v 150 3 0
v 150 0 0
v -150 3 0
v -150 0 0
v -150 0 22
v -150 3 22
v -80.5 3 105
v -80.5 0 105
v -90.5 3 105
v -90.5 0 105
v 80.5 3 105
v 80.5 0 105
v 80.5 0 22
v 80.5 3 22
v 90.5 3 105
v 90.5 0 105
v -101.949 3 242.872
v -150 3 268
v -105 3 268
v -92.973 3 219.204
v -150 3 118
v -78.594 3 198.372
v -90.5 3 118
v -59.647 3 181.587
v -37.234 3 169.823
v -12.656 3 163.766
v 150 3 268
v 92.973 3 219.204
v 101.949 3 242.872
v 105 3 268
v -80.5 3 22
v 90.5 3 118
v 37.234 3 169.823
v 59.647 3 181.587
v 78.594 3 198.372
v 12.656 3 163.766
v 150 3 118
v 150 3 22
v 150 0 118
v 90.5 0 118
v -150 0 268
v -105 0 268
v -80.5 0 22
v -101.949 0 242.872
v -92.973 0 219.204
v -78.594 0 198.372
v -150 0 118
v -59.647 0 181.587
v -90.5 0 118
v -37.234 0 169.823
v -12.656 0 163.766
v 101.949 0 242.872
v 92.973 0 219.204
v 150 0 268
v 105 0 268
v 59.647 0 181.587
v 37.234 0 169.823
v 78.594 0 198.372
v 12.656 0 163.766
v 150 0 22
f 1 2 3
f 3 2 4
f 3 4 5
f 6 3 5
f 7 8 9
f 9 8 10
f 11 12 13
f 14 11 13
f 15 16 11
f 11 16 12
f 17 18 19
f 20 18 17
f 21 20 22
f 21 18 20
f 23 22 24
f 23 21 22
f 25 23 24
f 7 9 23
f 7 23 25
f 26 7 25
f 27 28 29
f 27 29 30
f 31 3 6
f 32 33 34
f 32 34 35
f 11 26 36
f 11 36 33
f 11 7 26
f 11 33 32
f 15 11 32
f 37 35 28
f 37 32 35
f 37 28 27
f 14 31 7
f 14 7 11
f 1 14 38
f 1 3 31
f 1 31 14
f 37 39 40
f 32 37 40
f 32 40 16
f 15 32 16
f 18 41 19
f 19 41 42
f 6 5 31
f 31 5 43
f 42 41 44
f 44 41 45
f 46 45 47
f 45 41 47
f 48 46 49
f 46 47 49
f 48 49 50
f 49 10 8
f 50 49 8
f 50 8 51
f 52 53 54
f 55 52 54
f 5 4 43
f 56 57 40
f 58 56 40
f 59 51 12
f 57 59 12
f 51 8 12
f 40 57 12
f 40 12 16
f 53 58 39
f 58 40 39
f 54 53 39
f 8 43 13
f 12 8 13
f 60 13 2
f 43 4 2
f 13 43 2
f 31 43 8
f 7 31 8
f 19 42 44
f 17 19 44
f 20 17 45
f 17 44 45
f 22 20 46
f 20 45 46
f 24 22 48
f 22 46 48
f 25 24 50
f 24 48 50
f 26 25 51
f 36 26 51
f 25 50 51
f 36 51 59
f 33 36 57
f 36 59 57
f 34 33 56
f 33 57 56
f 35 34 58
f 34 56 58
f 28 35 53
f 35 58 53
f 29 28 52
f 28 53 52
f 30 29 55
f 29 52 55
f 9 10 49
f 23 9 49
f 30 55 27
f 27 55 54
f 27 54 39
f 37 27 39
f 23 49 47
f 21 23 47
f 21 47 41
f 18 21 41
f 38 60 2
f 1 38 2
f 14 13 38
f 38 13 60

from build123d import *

# Parameters (mm, degrees)
EXTRUSION1_DEPTH = 3


with BuildPart() as part:
    # Esquisse1 → Extrusion1 (new body)
    with BuildSketch(Plane(origin=(0, 0, 0), x_dir=(1, 0, 0), z_dir=(0, 1, 0))):
        with BuildLine():
            Line((150, 0), (-150, 0))
            Line((-150, 0), (-150, -22))
            Line((-150, -22), (-80.5, -22))
            Line((-80.5, -22), (-80.5, -105))
            Line((-80.5, -105), (-90.5, -105))
            Line((-90.5, -105), (-90.5, -118))
            Line((-90.5, -118), (-150, -118))
            Line((-150, -118), (-150, -268))
            Line((-150, -268), (-105, -268))
            ThreePointArc((-105, -268), (0, -163), (105, -268))
            Line((105, -268), (150, -268))
            Line((150, -268), (150, -118))
            Line((150, -118), (90.5, -118))
            Line((90.5, -118), (90.5, -105))
            Line((90.5, -105), (80.5, -105))
            Line((80.5, -105), (80.5, -22))
            Line((80.5, -22), (150, -22))
            Line((150, -22), (150, 0))
        make_face()
    extrude(amount=EXTRUSION1_DEPTH)


solid = part.part
